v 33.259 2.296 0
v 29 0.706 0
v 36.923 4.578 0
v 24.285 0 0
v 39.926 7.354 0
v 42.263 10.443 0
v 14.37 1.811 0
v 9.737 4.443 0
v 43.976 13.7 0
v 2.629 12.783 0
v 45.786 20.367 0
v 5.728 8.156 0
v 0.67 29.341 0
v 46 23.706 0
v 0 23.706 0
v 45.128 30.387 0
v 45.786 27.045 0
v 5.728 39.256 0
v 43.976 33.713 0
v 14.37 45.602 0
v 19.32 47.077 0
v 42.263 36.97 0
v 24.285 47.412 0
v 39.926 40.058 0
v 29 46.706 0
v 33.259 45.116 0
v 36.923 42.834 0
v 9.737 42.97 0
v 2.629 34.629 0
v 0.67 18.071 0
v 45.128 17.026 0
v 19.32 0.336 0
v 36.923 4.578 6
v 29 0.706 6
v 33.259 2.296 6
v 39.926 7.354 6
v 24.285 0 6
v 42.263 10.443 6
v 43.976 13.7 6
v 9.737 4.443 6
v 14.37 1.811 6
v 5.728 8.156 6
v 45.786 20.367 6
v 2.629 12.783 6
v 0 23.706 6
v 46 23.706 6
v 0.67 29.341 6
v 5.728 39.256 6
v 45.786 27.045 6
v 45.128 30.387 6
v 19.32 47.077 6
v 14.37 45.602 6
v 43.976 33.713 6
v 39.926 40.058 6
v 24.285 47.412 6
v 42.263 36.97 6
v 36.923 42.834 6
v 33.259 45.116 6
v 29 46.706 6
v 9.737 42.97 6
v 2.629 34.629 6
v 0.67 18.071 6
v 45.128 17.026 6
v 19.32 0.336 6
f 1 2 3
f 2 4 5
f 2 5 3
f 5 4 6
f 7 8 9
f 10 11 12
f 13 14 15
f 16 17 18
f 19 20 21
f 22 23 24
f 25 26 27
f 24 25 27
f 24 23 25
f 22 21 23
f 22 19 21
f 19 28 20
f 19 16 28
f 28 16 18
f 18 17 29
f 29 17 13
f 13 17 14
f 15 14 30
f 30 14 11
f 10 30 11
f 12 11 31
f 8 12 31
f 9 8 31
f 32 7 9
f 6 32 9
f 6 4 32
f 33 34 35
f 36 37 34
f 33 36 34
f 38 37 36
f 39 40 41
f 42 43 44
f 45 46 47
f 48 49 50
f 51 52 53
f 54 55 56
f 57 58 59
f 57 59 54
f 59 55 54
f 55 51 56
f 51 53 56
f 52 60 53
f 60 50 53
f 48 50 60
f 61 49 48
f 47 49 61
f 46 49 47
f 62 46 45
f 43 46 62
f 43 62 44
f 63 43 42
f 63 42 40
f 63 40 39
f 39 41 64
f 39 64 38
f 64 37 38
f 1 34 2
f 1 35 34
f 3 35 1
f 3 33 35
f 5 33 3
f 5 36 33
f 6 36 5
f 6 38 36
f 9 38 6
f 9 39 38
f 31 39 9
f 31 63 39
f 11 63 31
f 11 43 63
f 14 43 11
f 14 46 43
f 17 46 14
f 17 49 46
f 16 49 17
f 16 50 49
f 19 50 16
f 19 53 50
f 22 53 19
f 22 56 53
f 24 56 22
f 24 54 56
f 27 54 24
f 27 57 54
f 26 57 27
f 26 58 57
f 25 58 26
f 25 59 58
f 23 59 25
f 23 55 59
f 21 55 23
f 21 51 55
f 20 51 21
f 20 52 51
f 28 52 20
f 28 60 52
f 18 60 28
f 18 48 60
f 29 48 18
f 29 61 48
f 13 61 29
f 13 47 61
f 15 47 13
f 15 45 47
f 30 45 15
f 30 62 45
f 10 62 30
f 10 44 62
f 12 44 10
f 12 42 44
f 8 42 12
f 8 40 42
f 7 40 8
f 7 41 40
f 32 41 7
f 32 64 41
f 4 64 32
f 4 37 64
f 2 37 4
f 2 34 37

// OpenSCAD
$fn = 32;

// ----------------------------------------------------------------------
// Cam disc: base radius 17.0 mm, lift 12.0 mm, 32 profile points
// ----------------------------------------------------------------------

// --- parameters (mm) ---
profile_height = 6;       // extrusion height
profile_points = 32;      // points of the closed outline

profile = [[46, 23.706], [45.786, 27.045], [45.128, 30.387], [43.976, 33.713], [42.263, 36.97], [39.926, 40.058], [36.923, 42.834], [33.259, 45.116], [29, 46.706], [24.285, 47.412], [19.32, 47.077], [14.37, 45.602], [9.737, 42.97], [5.728, 39.256], [2.629, 34.629], [0.67, 29.341], [0, 23.706], [0.67, 18.071], [2.629, 12.783], [5.728, 8.156], [9.737, 4.443], [14.37, 1.811], [19.32, 0.336], [24.285, 0], [29, 0.706], [33.259, 2.296], [36.923, 4.578], [39.926, 7.354], [42.263, 10.443], [43.976, 13.7], [45.128, 17.026], [45.786, 20.367]];  // single closed polygon, 32 points, counter clockwise

// --- the one profile operation ---
linear_extrude(height = profile_height) polygon(points = profile);
